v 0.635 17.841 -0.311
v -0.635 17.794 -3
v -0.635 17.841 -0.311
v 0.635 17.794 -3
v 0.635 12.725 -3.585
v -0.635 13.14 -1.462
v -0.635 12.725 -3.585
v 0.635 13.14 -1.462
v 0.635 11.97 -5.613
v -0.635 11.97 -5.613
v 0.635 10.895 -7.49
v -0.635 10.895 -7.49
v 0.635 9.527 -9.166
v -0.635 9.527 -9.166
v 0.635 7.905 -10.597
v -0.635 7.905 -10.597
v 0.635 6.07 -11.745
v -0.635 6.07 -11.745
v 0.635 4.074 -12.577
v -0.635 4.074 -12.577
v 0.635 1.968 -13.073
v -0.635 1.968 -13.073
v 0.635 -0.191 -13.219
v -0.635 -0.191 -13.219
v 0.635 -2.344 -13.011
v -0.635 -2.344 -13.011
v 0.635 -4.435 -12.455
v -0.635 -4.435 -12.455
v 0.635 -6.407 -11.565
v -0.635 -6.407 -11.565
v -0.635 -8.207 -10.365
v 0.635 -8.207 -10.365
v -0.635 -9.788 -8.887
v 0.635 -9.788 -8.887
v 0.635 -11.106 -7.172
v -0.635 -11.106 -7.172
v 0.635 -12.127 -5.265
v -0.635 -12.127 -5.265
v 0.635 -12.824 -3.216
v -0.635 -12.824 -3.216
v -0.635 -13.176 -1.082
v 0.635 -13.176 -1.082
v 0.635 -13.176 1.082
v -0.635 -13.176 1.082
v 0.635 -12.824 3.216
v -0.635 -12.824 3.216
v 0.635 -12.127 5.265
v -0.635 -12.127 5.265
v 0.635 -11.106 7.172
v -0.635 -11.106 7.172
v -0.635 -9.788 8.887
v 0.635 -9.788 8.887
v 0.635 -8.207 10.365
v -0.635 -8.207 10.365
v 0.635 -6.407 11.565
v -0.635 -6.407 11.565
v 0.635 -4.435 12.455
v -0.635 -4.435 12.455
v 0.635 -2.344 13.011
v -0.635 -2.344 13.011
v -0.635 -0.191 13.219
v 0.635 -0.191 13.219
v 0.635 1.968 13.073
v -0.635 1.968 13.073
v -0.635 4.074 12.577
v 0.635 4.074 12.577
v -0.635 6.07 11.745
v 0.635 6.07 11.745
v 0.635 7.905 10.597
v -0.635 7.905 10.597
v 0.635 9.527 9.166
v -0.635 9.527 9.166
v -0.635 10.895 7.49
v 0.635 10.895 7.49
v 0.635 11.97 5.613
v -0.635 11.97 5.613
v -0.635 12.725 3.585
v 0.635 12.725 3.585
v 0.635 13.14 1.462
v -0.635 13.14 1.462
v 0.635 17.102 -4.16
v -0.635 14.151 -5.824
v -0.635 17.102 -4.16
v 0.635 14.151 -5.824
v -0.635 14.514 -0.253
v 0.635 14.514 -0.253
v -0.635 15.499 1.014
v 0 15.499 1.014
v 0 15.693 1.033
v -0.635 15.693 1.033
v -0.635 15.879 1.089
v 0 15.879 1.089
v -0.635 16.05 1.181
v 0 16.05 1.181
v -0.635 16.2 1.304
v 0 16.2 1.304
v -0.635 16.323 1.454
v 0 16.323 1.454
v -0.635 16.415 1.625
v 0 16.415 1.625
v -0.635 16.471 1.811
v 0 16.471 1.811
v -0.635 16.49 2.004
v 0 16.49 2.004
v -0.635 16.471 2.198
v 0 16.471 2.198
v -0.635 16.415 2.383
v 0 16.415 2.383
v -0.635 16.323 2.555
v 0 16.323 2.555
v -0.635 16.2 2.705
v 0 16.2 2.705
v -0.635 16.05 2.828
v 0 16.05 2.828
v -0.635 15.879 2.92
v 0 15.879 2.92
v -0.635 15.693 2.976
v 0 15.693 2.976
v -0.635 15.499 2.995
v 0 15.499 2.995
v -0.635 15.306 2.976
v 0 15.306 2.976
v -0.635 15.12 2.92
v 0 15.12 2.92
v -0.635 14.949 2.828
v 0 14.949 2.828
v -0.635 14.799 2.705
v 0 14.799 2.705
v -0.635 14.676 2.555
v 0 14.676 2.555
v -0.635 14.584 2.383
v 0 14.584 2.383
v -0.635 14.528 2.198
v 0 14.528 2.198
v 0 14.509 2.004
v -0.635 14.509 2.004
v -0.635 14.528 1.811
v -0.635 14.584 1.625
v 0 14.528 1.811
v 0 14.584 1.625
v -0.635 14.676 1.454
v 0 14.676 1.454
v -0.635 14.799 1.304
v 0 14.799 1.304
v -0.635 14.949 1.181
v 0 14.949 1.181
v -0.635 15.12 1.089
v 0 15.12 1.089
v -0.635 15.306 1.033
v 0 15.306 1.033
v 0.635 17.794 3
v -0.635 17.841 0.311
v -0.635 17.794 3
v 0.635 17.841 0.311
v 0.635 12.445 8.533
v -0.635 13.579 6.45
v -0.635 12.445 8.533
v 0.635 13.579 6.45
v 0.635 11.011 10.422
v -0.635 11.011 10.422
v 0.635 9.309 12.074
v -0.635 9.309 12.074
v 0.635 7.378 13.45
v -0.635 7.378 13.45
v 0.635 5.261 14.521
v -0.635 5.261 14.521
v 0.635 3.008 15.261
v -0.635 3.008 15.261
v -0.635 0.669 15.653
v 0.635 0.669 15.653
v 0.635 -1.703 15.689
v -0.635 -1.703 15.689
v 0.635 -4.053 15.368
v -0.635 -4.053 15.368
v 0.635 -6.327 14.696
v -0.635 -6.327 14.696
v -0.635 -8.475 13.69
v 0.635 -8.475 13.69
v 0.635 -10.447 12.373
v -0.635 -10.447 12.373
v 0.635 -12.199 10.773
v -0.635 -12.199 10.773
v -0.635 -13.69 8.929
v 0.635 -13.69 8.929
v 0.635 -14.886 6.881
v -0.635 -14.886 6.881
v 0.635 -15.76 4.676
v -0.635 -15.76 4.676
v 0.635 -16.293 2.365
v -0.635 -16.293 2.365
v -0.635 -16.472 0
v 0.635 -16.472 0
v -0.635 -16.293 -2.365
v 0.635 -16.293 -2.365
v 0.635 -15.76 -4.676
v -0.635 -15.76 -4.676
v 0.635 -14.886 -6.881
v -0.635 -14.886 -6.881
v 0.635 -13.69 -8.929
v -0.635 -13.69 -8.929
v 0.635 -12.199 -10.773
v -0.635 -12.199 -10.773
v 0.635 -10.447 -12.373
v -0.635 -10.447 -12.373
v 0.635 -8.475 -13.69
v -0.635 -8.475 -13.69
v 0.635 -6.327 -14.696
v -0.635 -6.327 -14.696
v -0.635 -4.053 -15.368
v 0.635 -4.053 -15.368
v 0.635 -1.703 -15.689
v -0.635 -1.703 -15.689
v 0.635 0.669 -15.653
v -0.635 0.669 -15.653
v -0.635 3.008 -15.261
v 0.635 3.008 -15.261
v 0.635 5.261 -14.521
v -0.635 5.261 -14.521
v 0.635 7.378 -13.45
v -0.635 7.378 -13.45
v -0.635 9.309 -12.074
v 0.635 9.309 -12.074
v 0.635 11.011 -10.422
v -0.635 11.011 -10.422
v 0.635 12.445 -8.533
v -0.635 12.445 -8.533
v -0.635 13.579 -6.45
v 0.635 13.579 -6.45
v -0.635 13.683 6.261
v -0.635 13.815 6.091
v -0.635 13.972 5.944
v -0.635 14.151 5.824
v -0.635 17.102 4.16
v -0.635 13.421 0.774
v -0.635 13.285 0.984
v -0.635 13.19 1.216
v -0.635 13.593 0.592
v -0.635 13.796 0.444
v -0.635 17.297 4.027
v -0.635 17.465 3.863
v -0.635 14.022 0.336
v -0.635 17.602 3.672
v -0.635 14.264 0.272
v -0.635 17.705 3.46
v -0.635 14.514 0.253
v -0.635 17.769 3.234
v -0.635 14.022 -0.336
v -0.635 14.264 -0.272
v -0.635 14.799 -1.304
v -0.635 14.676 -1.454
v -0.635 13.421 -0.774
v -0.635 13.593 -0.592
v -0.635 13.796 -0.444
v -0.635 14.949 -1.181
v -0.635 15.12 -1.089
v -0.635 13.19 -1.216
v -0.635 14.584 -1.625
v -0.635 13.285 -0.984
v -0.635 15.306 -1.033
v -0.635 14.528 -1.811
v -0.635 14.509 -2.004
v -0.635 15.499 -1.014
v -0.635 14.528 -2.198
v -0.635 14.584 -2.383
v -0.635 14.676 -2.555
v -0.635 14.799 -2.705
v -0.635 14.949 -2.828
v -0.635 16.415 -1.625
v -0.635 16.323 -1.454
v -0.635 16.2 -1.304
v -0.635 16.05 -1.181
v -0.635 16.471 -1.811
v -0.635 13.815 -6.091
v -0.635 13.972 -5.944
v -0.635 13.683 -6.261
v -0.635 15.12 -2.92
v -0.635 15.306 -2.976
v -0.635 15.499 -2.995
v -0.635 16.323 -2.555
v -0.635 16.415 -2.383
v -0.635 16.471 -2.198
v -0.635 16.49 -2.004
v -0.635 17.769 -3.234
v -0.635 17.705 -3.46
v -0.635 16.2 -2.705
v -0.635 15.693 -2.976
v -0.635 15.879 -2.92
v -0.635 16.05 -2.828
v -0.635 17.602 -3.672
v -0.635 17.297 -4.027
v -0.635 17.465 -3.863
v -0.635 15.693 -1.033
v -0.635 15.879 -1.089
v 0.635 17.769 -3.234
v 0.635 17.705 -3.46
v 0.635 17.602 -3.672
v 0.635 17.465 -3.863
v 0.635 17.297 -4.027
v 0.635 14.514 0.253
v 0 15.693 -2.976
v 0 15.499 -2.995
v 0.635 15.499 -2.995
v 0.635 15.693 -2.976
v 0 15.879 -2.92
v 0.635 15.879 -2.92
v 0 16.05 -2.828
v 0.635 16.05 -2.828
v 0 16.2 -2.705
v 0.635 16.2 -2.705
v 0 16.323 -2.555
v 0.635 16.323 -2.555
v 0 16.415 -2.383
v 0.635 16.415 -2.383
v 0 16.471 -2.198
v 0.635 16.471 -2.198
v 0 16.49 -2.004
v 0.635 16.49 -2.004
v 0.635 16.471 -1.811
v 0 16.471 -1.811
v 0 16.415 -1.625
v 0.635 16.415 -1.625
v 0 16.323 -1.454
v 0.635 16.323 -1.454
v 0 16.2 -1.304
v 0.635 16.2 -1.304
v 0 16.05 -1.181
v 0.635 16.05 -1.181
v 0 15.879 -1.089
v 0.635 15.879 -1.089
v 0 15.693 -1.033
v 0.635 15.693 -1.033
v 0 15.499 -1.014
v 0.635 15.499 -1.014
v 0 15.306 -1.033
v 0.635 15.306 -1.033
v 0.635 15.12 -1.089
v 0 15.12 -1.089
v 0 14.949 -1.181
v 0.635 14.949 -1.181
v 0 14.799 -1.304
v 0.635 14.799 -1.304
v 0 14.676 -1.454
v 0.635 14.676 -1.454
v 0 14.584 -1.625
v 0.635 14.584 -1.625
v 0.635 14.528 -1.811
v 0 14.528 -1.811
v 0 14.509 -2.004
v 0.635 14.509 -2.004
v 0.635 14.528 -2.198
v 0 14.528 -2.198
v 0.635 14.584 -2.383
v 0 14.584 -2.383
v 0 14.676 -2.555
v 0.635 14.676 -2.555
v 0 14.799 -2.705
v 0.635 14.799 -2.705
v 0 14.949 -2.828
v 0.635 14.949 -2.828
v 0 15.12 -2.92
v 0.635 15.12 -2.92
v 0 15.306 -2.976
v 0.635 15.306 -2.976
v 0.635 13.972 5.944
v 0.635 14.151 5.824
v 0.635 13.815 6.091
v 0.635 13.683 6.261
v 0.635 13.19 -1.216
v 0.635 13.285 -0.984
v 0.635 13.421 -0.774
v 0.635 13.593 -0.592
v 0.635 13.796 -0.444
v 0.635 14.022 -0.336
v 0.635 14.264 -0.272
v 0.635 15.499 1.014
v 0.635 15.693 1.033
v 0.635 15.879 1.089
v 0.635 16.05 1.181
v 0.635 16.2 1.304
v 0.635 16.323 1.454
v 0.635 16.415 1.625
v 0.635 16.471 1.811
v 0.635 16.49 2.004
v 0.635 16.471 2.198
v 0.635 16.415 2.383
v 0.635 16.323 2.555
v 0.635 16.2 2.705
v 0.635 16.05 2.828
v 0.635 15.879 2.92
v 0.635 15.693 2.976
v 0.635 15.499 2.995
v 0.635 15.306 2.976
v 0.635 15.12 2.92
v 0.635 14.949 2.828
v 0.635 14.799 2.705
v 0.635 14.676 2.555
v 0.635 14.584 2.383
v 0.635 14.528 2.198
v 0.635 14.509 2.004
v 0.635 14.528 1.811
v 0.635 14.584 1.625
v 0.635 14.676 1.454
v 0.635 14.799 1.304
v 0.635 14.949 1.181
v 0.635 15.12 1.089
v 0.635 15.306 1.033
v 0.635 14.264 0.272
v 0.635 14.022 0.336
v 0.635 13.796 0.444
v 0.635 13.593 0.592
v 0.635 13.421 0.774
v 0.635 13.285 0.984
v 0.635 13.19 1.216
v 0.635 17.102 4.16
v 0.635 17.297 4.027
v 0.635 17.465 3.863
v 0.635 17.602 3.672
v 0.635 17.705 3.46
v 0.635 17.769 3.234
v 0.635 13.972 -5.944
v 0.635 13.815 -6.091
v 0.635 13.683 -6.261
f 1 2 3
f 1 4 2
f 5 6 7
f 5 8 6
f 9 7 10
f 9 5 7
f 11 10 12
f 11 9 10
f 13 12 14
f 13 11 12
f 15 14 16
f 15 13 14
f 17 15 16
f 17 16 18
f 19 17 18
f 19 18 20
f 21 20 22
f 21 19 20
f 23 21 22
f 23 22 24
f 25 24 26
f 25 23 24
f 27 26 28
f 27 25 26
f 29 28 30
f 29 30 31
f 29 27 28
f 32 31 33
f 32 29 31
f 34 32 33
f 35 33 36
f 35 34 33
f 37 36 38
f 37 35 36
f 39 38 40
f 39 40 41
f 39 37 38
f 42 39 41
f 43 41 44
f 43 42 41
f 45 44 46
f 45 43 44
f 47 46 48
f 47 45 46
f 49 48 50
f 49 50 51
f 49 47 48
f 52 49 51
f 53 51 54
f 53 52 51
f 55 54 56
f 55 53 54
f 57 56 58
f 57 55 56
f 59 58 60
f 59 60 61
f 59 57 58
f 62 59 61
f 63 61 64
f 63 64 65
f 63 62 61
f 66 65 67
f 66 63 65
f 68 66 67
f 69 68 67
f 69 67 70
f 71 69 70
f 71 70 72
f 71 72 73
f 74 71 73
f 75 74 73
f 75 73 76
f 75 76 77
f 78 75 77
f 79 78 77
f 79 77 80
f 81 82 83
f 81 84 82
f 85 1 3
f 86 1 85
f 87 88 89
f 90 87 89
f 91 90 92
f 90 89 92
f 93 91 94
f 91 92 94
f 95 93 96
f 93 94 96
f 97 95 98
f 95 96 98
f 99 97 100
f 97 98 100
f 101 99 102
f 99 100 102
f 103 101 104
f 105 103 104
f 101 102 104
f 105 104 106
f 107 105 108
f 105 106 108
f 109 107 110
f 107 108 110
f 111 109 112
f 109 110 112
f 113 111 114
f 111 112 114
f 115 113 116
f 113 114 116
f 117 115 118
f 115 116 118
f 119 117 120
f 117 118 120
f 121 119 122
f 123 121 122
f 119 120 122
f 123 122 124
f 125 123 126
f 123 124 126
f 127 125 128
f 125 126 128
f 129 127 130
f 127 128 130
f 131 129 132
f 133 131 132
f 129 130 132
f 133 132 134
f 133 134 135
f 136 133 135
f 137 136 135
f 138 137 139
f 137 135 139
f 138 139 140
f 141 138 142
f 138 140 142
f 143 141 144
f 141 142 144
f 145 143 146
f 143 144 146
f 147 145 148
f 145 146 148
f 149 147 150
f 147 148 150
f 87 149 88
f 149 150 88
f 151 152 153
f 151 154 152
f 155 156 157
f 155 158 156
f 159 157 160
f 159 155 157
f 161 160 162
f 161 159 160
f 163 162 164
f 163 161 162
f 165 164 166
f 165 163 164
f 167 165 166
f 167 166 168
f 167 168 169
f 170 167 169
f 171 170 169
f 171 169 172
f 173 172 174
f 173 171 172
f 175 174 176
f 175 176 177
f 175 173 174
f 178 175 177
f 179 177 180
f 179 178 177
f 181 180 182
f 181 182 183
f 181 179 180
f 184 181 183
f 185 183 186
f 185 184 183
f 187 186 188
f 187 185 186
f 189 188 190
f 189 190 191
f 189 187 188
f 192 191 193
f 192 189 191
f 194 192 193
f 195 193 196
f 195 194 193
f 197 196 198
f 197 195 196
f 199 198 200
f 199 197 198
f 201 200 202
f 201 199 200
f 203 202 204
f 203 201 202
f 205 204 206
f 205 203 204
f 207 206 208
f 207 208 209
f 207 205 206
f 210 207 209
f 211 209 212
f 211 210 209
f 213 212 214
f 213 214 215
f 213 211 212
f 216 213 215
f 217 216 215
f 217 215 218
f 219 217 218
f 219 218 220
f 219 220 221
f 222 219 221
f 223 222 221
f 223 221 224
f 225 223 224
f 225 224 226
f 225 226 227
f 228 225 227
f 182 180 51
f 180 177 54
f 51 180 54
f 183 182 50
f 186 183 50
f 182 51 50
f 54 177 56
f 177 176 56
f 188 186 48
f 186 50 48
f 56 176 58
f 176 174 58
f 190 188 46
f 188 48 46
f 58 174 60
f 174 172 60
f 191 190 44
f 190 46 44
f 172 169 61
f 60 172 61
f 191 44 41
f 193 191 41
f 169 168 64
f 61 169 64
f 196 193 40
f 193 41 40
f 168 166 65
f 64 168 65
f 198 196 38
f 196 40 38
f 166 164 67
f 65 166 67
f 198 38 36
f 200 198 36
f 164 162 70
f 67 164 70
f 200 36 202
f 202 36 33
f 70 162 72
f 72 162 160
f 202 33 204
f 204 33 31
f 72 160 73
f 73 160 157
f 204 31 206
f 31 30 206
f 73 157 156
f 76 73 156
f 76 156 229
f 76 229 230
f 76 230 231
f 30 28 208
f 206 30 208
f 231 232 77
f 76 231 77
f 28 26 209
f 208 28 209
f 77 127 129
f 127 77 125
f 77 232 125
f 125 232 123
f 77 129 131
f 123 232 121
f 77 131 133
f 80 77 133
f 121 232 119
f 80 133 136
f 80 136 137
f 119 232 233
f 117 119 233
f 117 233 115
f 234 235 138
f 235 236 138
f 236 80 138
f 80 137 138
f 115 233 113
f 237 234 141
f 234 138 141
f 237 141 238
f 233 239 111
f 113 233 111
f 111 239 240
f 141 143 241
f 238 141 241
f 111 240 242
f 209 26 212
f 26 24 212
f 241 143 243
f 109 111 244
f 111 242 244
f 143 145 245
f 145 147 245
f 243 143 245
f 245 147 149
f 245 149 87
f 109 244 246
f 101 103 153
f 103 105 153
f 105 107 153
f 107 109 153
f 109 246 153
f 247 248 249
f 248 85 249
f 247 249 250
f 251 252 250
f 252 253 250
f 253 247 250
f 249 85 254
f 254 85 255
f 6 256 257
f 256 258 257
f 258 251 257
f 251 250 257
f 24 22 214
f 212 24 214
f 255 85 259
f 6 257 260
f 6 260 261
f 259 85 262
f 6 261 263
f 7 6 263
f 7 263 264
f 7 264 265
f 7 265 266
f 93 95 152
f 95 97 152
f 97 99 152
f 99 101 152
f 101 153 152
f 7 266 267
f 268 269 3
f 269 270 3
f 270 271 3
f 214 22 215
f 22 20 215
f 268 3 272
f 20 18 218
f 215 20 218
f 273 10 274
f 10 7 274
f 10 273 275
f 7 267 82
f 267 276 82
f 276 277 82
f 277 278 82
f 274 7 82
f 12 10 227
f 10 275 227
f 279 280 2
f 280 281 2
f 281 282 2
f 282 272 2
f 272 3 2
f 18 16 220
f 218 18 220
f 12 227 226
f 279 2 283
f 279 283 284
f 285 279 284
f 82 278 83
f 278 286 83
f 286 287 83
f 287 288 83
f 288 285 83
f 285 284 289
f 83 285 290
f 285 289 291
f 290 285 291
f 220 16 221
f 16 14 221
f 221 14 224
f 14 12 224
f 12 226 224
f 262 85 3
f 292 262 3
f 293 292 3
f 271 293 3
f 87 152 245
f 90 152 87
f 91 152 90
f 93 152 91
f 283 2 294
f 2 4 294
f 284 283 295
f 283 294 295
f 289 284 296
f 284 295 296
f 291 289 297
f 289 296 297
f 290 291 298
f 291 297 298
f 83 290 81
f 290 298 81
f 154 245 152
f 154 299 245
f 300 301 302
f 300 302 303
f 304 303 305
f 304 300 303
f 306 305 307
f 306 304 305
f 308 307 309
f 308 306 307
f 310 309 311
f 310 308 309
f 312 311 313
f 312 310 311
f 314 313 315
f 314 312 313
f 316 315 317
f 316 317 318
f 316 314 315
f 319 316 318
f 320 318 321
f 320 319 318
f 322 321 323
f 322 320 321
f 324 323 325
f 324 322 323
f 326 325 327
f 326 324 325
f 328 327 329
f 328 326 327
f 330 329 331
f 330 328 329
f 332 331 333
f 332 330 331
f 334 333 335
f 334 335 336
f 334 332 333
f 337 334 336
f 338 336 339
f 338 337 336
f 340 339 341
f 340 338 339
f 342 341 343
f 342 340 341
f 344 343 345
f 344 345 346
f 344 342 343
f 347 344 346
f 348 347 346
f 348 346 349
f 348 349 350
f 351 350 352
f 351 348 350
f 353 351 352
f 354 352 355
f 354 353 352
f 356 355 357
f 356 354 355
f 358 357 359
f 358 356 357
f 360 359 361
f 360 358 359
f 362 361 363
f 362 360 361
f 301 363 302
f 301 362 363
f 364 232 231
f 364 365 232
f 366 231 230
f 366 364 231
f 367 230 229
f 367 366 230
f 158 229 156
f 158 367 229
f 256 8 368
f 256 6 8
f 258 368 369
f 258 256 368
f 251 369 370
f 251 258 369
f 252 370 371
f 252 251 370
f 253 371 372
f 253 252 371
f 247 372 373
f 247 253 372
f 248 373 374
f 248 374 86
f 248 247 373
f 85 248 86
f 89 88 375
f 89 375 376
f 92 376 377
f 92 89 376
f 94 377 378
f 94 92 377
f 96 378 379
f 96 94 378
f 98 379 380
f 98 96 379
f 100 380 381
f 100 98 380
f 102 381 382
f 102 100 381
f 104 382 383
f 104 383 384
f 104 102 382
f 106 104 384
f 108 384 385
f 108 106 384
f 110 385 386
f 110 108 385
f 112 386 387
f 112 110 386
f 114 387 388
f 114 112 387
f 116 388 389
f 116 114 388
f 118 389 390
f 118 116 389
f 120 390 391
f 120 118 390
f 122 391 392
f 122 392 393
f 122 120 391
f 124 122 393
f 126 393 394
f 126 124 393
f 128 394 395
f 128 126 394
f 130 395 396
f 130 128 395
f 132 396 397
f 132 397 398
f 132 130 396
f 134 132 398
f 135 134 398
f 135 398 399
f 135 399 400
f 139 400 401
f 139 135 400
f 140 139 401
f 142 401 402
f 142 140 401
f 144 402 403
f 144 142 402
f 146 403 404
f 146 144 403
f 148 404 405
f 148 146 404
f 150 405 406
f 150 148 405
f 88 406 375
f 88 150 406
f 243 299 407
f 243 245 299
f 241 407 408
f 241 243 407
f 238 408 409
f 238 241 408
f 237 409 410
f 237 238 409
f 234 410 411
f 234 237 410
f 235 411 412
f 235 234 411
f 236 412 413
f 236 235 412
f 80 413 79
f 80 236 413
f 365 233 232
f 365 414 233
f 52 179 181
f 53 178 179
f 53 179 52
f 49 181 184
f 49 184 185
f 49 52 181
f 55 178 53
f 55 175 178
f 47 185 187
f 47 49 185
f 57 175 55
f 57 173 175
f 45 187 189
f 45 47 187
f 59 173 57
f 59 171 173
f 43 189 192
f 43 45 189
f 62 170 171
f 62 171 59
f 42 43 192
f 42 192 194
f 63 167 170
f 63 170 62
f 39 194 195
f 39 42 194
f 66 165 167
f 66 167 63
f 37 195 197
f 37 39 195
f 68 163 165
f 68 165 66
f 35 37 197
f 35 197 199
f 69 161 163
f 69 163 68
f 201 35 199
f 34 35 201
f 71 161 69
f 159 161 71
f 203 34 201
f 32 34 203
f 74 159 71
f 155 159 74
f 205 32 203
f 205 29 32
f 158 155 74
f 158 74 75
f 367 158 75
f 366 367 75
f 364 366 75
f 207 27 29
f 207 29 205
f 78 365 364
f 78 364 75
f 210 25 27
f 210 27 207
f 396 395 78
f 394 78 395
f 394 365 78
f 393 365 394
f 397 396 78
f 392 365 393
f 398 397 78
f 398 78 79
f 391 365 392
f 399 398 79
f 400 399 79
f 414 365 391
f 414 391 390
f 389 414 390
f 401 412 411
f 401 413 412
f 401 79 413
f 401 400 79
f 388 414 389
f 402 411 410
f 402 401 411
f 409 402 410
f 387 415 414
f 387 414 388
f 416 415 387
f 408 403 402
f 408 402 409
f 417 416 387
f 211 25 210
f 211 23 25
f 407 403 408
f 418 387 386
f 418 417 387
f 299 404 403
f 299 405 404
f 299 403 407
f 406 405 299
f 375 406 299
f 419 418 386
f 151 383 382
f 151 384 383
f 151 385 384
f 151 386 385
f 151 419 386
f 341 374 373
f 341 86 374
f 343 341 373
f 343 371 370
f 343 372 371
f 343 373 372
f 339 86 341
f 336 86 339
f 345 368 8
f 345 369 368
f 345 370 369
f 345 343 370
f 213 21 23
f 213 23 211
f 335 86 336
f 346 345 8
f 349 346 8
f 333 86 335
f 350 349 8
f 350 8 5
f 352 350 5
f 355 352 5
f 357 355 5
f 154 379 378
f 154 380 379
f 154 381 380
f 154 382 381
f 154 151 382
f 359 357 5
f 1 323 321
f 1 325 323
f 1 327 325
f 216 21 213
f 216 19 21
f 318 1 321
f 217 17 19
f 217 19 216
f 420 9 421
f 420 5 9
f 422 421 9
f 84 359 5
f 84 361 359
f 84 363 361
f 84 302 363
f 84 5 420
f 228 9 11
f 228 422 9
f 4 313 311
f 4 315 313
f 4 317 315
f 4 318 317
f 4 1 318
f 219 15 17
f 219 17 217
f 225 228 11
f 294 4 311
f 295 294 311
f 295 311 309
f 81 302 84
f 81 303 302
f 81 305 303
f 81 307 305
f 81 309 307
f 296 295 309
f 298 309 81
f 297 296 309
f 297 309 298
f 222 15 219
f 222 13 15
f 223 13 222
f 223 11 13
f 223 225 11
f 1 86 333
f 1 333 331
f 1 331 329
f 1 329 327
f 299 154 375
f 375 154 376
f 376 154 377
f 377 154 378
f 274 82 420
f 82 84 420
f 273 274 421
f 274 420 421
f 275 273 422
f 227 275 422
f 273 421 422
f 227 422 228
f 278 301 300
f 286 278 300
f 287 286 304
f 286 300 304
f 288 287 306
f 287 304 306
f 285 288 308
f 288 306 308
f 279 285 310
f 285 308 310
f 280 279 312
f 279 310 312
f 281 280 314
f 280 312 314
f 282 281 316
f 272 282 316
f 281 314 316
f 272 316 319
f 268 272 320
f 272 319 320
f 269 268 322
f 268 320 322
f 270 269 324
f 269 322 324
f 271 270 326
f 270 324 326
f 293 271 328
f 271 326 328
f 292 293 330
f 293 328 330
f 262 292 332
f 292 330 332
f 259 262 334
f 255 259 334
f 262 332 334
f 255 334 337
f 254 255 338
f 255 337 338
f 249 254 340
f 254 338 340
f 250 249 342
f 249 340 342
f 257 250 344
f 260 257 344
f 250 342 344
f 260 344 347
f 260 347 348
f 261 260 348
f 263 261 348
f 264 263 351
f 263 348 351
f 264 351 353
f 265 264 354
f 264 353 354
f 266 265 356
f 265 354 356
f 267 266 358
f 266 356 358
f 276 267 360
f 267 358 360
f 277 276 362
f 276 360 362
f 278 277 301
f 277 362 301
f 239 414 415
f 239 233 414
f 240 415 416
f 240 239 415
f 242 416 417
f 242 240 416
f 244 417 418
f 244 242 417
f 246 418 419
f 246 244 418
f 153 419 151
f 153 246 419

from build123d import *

# Parameters (mm, degrees)
SKETCH3_R                = 0.9906
BOSS_EXTRUDE1_DEPTH      = 0.635
BOSS_EXTRUDE1_DEPTH_BACK = 0.635
FILLET1_R                = 1.3589


with BuildPart() as part:
    # Sketch3 → Boss-Extrude1 (new body, two sides)
    with BuildSketch(Plane(origin=(0, 0, 0), x_dir=(0, 0, -1), z_dir=(1, 0, 0))) as boss_extrude1_sk:
        with BuildLine():
            Line((-3.777983958, 17.78027311), (-6.047809043, 13.75309371))
            ThreePointArc((-6.047809043, 13.75309371), (0, -16.4719), (6.047809043, 13.75309371))
            Line((6.047809043, 13.75309371), (3.777983958, 17.78027311))
            Line((3.777983958, 17.78027311), (0.311412014, 17.840782349))
            Line((0.311412014, 17.840782349), (0.23073303, 13.218686423))
            ThreePointArc((0.23073303, 13.218686423), (0, -13.2207), (-0.23073303, 13.218686423))
            Line((-0.23073303, 13.218686423), (-0.311412014, 17.840782349))
            Line((-0.311412014, 17.840782349), (-3.777983958, 17.78027311))
        make_face()
        with Locations((-2.004358494, 15.499479767)):
            Circle(SKETCH3_R, mode=Mode.SUBTRACT)
        with Locations((2.004358494, 15.499479767)):
            Circle(SKETCH3_R, mode=Mode.SUBTRACT)
    extrude(amount=BOSS_EXTRUDE1_DEPTH)
    extrude(boss_extrude1_sk.sketch, amount=-BOSS_EXTRUDE1_DEPTH_BACK)

    # Fillet1
    fillet1_edges = [part.edges().sort_by_distance(p)[0] for p in [
        (0, 13.75309371, 6.047809043),
        (0, 17.78027311, 3.777983958),
        (0, 13.218686423, 0.23073303),
        (0, 13.218686423, -0.23073303),
        (0, 17.78027311, -3.777983958),
        (0, 13.75309371, -6.047809043),
    ]]
    fillet(fillet1_edges, radius=FILLET1_R)


solid = part.part
